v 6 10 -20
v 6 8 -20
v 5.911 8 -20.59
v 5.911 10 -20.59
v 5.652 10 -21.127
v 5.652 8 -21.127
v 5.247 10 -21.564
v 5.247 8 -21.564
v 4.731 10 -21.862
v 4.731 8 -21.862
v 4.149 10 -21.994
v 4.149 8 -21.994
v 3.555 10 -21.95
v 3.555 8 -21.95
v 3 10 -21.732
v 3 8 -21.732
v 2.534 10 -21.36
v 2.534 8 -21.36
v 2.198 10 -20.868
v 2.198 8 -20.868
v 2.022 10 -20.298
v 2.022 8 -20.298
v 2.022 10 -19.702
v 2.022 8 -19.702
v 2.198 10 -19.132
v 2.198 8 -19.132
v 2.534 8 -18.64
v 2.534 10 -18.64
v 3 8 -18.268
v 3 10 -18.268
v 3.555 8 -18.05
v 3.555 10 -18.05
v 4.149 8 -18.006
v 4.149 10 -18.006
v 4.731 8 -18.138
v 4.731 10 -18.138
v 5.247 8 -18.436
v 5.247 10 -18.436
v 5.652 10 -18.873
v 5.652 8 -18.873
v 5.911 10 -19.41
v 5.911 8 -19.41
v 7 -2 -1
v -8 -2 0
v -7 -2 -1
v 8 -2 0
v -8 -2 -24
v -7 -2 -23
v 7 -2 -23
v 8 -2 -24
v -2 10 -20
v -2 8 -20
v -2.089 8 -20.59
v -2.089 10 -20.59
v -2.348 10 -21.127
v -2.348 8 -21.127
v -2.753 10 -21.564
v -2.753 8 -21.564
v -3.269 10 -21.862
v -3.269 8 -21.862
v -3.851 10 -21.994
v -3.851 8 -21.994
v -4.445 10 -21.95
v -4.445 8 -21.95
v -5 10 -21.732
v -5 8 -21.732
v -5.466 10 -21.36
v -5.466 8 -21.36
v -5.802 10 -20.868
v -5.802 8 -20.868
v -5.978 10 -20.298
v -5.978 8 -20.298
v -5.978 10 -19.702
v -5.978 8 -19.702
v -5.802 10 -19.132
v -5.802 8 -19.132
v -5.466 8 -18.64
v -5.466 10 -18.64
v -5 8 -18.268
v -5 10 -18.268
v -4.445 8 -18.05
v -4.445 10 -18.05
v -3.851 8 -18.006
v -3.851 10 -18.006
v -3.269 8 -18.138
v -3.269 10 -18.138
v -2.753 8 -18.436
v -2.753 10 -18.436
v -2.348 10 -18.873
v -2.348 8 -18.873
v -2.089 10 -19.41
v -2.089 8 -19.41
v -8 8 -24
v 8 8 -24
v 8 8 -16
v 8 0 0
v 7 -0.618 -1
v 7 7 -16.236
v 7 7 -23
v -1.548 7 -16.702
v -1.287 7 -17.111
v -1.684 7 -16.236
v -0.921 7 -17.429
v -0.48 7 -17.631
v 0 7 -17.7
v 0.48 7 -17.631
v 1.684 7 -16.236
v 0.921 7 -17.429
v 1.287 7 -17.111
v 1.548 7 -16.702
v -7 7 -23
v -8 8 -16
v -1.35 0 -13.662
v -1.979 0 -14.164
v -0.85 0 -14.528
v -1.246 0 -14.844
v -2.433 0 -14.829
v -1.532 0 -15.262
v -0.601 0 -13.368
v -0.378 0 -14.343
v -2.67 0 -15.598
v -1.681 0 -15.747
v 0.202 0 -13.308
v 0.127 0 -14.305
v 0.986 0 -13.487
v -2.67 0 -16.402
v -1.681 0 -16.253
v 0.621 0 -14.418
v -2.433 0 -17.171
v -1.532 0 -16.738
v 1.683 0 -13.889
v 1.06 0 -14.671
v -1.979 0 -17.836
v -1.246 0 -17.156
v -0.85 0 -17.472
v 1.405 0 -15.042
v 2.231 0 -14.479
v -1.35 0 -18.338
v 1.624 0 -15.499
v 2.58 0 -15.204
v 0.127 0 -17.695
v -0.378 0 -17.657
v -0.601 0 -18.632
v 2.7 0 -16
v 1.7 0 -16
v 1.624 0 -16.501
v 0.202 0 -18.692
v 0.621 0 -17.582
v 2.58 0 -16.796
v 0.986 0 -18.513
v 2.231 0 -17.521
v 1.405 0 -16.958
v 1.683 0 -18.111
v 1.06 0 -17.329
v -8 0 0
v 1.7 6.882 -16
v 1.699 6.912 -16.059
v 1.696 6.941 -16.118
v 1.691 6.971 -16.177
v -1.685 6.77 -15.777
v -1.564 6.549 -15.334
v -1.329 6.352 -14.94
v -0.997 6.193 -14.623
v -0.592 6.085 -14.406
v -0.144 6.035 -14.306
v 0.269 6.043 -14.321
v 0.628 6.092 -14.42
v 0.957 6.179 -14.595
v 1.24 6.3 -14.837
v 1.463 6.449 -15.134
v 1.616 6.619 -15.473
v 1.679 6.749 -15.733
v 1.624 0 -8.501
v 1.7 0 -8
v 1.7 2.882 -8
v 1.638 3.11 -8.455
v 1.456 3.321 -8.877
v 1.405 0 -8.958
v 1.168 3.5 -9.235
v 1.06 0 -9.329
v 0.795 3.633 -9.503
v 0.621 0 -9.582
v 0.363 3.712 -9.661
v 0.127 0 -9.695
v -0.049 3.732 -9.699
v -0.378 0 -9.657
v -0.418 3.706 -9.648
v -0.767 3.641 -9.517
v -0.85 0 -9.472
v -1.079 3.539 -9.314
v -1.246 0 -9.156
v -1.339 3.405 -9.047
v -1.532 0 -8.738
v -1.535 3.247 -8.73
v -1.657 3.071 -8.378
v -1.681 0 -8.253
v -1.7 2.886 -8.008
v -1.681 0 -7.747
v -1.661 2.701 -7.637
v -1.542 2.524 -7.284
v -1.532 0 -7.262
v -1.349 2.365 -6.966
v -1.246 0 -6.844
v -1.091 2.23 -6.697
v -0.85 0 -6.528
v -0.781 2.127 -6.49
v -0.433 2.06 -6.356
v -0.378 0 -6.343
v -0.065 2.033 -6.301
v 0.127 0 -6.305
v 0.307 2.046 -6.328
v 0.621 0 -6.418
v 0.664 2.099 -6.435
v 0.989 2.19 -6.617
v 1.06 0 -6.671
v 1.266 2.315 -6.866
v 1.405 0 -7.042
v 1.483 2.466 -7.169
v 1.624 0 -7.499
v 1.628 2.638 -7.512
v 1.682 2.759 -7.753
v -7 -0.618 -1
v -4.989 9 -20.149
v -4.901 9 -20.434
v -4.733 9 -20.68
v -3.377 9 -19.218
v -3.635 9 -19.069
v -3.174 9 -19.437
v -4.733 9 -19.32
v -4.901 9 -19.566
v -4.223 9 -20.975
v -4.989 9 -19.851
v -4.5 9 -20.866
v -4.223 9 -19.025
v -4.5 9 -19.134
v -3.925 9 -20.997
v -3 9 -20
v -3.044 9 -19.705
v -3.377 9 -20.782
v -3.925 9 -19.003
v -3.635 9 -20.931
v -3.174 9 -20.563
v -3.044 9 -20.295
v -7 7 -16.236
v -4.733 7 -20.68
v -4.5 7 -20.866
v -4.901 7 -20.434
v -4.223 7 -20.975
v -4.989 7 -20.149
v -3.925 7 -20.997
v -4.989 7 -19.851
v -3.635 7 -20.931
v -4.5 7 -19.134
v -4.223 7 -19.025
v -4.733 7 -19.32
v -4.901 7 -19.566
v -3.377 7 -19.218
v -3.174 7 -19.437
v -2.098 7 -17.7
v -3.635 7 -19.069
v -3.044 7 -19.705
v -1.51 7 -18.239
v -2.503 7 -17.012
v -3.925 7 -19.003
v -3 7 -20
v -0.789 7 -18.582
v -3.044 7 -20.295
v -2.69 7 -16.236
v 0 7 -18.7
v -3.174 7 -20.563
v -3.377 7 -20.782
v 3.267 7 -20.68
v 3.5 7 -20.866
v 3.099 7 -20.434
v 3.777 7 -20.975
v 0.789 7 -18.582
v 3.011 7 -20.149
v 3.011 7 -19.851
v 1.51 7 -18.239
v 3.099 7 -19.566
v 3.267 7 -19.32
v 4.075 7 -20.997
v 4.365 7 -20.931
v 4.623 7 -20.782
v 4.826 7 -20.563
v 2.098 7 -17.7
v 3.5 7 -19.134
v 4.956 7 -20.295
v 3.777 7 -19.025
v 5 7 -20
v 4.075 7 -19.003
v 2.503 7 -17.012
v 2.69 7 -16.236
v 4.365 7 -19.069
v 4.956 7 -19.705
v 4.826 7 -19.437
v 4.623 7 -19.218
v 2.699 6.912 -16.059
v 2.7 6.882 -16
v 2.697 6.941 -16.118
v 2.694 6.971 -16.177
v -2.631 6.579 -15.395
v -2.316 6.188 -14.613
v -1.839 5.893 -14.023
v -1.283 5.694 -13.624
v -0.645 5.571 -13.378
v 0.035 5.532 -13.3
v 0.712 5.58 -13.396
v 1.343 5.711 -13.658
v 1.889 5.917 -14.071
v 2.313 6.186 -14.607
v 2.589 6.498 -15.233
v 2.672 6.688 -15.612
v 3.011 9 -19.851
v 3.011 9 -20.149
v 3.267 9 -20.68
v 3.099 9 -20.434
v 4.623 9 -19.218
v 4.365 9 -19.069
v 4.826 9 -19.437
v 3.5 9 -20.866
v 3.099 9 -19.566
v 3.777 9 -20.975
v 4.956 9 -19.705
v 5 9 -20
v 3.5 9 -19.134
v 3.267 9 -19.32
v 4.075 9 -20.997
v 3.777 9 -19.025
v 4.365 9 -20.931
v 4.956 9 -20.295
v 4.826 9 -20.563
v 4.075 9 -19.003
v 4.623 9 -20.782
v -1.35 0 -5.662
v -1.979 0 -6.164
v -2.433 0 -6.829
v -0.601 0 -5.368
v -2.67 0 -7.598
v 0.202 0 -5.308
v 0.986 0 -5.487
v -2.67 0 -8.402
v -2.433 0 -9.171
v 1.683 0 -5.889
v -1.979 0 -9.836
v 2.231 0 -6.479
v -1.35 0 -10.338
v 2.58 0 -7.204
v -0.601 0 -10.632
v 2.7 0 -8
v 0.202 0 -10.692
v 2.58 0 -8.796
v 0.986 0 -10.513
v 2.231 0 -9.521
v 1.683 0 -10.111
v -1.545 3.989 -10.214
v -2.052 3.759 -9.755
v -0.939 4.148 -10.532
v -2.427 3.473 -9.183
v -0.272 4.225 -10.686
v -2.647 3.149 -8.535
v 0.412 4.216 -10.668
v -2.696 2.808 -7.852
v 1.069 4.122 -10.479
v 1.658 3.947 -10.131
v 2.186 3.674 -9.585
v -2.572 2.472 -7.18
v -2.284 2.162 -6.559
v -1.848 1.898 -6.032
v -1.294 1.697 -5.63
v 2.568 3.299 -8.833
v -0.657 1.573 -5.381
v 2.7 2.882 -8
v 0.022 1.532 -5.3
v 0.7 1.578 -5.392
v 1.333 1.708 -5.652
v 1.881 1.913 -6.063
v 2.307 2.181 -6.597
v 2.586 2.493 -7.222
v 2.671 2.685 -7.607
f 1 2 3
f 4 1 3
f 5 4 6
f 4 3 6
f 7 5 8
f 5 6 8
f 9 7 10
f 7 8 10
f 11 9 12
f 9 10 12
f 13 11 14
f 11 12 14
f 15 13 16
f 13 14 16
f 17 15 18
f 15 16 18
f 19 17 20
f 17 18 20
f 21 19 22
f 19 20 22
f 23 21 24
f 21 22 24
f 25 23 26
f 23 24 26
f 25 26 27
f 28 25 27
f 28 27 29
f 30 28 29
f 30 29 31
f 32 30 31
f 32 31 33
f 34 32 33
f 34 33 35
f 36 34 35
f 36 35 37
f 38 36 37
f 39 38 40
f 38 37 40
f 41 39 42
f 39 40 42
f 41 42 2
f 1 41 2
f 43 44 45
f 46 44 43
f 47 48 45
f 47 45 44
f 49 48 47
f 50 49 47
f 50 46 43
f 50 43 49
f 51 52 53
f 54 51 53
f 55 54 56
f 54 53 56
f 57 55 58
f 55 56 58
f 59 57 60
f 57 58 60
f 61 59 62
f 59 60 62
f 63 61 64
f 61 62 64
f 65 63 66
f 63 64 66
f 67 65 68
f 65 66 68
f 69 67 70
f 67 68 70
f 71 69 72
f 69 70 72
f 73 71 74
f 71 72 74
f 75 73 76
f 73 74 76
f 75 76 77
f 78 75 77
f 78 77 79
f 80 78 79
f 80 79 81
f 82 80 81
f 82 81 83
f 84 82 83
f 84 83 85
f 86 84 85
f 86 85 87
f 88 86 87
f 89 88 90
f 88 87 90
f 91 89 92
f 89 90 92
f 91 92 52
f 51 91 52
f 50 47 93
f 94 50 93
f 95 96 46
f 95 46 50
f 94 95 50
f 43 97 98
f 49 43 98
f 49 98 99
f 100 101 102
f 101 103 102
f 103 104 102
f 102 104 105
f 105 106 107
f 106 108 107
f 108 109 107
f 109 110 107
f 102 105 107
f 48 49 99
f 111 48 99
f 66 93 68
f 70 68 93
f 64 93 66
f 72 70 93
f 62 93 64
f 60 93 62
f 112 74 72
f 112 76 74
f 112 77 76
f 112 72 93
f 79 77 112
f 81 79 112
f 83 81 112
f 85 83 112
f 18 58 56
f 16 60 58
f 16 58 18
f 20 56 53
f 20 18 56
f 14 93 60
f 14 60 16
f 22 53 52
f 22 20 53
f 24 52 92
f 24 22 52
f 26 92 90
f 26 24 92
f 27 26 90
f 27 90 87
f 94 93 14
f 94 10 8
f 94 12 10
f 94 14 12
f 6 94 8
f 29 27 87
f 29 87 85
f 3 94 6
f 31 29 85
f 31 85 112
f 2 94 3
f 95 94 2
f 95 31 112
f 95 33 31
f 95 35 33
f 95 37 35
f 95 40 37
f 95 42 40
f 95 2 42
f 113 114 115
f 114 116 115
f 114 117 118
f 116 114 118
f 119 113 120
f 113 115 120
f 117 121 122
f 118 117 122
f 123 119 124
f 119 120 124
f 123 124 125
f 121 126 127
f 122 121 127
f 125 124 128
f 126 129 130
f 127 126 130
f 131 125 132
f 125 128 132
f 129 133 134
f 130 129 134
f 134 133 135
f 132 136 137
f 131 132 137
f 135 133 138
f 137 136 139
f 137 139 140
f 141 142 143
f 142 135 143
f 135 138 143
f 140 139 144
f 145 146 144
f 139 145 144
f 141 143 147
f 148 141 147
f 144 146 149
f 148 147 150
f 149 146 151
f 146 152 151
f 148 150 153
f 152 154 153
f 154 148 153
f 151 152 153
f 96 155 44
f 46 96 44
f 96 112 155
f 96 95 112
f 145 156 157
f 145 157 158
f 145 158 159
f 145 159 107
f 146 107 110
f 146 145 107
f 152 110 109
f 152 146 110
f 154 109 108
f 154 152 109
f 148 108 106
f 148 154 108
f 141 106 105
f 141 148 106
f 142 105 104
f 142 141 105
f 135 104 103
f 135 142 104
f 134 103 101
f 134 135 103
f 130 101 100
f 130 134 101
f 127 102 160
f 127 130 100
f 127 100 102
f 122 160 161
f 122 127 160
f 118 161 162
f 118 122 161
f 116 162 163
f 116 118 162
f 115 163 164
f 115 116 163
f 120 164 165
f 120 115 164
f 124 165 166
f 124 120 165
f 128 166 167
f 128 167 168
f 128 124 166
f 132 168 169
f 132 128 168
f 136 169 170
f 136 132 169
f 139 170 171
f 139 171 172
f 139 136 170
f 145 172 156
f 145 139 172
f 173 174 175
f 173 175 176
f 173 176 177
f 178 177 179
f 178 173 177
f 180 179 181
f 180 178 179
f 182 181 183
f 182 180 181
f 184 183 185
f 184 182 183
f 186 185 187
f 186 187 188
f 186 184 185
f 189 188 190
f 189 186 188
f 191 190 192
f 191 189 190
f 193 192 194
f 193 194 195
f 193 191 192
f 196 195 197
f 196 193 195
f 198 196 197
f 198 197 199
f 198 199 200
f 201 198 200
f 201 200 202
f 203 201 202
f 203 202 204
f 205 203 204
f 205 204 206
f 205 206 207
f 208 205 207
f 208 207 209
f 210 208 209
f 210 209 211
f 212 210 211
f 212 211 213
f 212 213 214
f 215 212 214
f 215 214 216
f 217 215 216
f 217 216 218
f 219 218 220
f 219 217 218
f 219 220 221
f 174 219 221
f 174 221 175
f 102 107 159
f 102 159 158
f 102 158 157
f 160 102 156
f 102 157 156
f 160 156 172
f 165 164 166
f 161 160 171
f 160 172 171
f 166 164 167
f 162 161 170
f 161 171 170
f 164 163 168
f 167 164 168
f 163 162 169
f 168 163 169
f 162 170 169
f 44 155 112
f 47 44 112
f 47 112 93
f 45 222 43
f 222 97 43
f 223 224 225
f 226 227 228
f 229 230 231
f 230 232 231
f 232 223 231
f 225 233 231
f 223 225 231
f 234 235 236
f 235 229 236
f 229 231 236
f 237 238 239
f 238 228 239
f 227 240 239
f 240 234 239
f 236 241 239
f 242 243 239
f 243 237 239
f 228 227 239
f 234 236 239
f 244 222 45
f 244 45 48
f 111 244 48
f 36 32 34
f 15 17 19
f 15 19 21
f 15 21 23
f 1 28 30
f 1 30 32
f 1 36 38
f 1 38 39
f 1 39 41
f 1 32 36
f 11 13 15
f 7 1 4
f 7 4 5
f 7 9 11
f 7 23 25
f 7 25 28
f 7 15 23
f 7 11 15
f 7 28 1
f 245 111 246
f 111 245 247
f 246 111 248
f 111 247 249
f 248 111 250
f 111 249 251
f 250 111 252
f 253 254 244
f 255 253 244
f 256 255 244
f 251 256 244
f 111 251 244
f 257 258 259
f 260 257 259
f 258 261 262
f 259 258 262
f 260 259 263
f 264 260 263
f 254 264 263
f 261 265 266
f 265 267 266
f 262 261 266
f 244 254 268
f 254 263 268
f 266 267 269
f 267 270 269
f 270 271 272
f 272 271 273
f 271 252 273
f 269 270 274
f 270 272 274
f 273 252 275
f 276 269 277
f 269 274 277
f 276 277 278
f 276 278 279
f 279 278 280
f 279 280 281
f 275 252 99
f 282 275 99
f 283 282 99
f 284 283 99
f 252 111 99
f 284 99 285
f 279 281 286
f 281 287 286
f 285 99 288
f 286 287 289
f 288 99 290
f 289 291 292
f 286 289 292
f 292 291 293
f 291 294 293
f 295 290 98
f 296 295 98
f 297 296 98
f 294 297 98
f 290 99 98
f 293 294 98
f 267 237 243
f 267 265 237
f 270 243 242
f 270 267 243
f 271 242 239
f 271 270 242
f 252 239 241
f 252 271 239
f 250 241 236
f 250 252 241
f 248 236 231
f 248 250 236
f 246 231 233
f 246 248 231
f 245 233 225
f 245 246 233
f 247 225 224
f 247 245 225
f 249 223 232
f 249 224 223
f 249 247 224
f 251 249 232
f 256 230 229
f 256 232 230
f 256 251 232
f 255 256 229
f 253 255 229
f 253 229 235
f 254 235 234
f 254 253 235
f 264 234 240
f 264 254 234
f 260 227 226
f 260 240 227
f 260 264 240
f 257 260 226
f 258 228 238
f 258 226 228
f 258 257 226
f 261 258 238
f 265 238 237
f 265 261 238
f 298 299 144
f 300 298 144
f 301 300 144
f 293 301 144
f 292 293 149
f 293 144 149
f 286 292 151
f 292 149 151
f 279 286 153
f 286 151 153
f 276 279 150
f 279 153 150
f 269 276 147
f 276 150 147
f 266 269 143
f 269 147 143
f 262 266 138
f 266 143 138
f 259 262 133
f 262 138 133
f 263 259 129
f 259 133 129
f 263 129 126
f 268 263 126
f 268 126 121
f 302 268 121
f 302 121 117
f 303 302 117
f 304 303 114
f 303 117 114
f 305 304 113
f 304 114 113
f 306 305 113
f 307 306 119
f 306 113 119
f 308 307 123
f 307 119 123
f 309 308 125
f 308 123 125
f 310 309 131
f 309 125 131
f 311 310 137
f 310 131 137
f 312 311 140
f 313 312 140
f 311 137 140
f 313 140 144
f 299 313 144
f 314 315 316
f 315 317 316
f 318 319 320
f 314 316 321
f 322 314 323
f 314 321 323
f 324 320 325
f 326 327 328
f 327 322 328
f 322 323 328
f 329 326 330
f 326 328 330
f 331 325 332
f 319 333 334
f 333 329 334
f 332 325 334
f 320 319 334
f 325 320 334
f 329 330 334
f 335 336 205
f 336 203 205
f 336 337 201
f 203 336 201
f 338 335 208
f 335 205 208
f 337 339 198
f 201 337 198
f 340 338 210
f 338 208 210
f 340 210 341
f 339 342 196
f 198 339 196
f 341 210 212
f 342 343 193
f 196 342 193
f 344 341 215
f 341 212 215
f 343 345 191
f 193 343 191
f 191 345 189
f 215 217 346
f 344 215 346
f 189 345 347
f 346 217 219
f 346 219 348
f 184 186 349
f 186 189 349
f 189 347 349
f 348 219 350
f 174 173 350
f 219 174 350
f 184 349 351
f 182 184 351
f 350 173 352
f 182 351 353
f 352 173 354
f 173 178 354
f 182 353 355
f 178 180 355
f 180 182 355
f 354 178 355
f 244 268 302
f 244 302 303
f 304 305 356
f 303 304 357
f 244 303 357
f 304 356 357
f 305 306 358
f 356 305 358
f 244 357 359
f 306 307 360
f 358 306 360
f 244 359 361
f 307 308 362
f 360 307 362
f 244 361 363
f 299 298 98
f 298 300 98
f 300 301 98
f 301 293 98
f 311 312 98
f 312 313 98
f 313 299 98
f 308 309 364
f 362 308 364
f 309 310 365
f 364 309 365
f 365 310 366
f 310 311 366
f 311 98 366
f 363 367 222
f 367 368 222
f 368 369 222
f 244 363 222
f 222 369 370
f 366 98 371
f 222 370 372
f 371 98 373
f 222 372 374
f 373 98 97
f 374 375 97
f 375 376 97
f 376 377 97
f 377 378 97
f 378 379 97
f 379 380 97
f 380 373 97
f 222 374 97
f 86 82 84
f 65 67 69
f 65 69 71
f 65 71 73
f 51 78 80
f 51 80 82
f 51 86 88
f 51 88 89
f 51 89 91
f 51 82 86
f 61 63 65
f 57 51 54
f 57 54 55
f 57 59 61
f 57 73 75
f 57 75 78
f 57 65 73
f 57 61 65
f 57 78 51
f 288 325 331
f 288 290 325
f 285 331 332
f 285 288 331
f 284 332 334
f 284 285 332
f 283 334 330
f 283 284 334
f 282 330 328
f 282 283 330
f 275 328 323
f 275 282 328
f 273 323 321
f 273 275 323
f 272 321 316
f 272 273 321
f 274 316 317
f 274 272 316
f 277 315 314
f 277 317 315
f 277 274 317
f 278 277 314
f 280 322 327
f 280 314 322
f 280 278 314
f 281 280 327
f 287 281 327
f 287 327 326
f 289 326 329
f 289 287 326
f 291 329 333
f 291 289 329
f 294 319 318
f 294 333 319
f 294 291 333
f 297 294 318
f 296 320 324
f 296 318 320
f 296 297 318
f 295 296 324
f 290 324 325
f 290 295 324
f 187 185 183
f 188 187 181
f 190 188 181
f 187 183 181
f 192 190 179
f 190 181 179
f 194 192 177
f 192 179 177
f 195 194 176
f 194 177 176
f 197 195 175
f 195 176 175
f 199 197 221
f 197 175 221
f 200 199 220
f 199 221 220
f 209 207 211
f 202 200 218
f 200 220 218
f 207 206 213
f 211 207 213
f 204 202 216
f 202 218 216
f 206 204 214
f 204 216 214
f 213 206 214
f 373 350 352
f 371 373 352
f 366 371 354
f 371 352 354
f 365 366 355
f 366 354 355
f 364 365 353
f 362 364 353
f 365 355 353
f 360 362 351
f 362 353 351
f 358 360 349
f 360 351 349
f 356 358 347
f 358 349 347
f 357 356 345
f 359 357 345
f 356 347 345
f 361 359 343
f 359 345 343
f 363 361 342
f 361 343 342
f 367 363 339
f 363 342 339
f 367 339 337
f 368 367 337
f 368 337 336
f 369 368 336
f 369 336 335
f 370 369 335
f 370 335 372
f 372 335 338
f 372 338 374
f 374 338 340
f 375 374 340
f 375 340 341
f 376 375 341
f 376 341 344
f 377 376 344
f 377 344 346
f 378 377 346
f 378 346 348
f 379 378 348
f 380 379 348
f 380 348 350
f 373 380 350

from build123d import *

# Parameters (mm, degrees)
BOSS_EXTRUDE1_DEPTH = 8
SKETCH2_R           = 2
BOSS_EXTRUDE2_DEPTH = 2
SHELL1_T            = -1
BOSS_EXTRUDE3_REACH = 12
SKETCH3_R           = 2.7
SKETCH3_R_2         = 1.7


with BuildPart() as part:
    # Sketch1 → Boss-Extrude1 (new body, symmetric)
    with BuildSketch(Plane(origin=(0, 0, 0), x_dir=(0, 0, -1), z_dir=(1, 0, 0))):
        Polygon((0, 0), (0, -2), (24, -2), (24, 8), (16, 8), align=None)
    extrude(amount=BOSS_EXTRUDE1_DEPTH, both=True)

    # Sketch2 → Boss-Extrude2 (add)
    with BuildSketch(Plane(origin=(0, 8, 0), x_dir=(1, 0, 0), z_dir=(0, 1, 0))):
        with Locations((-4, 20)):
            Circle(SKETCH2_R)
        with Locations((4, 20)):
            Circle(SKETCH2_R)
    extrude(amount=BOSS_EXTRUDE2_DEPTH)

    # Shell1
    shell1_openings = [part.faces().sort_by_distance(p)[0] for p in [
        (0, -2, -12),
    ]]
    offset(amount=SHELL1_T, openings=shell1_openings, kind=Kind.INTERSECTION)

    # Sketch3 → Boss-Extrude3 (add, up to next)
    with BuildSketch(Plane(origin=(0, 0, 0), x_dir=(1, 0, 0), z_dir=(0, 1, 0)), mode=Mode.PRIVATE) as boss_extrude3_sk1:
        with Locations((0, 8)):
            Circle(SKETCH3_R)
        with Locations((0, 8)):
            Circle(SKETCH3_R_2, mode=Mode.SUBTRACT)
    boss_extrude3_tool1 = extrude(boss_extrude3_sk1.sketch, amount=BOSS_EXTRUDE3_REACH, mode=Mode.PRIVATE) - part.part
    add(boss_extrude3_tool1.solids().sort_by_distance((-2.623632, 0, -8))[0])
    # Sketch3 → Boss-Extrude3 (add, up to next)
    with BuildSketch(Plane(origin=(0, 0, 0), x_dir=(1, 0, 0), z_dir=(0, 1, 0)), mode=Mode.PRIVATE) as boss_extrude3_sk2:
        with Locations((0, 16)):
            Circle(SKETCH3_R)
        with Locations((0, 16)):
            Circle(SKETCH3_R_2, mode=Mode.SUBTRACT)
    boss_extrude3_tool2 = extrude(boss_extrude3_sk2.sketch, amount=BOSS_EXTRUDE3_REACH, mode=Mode.PRIVATE) - part.part
    add(boss_extrude3_tool2.solids().sort_by_distance((-2.623632, 0, -16))[0])


solid = part.part
